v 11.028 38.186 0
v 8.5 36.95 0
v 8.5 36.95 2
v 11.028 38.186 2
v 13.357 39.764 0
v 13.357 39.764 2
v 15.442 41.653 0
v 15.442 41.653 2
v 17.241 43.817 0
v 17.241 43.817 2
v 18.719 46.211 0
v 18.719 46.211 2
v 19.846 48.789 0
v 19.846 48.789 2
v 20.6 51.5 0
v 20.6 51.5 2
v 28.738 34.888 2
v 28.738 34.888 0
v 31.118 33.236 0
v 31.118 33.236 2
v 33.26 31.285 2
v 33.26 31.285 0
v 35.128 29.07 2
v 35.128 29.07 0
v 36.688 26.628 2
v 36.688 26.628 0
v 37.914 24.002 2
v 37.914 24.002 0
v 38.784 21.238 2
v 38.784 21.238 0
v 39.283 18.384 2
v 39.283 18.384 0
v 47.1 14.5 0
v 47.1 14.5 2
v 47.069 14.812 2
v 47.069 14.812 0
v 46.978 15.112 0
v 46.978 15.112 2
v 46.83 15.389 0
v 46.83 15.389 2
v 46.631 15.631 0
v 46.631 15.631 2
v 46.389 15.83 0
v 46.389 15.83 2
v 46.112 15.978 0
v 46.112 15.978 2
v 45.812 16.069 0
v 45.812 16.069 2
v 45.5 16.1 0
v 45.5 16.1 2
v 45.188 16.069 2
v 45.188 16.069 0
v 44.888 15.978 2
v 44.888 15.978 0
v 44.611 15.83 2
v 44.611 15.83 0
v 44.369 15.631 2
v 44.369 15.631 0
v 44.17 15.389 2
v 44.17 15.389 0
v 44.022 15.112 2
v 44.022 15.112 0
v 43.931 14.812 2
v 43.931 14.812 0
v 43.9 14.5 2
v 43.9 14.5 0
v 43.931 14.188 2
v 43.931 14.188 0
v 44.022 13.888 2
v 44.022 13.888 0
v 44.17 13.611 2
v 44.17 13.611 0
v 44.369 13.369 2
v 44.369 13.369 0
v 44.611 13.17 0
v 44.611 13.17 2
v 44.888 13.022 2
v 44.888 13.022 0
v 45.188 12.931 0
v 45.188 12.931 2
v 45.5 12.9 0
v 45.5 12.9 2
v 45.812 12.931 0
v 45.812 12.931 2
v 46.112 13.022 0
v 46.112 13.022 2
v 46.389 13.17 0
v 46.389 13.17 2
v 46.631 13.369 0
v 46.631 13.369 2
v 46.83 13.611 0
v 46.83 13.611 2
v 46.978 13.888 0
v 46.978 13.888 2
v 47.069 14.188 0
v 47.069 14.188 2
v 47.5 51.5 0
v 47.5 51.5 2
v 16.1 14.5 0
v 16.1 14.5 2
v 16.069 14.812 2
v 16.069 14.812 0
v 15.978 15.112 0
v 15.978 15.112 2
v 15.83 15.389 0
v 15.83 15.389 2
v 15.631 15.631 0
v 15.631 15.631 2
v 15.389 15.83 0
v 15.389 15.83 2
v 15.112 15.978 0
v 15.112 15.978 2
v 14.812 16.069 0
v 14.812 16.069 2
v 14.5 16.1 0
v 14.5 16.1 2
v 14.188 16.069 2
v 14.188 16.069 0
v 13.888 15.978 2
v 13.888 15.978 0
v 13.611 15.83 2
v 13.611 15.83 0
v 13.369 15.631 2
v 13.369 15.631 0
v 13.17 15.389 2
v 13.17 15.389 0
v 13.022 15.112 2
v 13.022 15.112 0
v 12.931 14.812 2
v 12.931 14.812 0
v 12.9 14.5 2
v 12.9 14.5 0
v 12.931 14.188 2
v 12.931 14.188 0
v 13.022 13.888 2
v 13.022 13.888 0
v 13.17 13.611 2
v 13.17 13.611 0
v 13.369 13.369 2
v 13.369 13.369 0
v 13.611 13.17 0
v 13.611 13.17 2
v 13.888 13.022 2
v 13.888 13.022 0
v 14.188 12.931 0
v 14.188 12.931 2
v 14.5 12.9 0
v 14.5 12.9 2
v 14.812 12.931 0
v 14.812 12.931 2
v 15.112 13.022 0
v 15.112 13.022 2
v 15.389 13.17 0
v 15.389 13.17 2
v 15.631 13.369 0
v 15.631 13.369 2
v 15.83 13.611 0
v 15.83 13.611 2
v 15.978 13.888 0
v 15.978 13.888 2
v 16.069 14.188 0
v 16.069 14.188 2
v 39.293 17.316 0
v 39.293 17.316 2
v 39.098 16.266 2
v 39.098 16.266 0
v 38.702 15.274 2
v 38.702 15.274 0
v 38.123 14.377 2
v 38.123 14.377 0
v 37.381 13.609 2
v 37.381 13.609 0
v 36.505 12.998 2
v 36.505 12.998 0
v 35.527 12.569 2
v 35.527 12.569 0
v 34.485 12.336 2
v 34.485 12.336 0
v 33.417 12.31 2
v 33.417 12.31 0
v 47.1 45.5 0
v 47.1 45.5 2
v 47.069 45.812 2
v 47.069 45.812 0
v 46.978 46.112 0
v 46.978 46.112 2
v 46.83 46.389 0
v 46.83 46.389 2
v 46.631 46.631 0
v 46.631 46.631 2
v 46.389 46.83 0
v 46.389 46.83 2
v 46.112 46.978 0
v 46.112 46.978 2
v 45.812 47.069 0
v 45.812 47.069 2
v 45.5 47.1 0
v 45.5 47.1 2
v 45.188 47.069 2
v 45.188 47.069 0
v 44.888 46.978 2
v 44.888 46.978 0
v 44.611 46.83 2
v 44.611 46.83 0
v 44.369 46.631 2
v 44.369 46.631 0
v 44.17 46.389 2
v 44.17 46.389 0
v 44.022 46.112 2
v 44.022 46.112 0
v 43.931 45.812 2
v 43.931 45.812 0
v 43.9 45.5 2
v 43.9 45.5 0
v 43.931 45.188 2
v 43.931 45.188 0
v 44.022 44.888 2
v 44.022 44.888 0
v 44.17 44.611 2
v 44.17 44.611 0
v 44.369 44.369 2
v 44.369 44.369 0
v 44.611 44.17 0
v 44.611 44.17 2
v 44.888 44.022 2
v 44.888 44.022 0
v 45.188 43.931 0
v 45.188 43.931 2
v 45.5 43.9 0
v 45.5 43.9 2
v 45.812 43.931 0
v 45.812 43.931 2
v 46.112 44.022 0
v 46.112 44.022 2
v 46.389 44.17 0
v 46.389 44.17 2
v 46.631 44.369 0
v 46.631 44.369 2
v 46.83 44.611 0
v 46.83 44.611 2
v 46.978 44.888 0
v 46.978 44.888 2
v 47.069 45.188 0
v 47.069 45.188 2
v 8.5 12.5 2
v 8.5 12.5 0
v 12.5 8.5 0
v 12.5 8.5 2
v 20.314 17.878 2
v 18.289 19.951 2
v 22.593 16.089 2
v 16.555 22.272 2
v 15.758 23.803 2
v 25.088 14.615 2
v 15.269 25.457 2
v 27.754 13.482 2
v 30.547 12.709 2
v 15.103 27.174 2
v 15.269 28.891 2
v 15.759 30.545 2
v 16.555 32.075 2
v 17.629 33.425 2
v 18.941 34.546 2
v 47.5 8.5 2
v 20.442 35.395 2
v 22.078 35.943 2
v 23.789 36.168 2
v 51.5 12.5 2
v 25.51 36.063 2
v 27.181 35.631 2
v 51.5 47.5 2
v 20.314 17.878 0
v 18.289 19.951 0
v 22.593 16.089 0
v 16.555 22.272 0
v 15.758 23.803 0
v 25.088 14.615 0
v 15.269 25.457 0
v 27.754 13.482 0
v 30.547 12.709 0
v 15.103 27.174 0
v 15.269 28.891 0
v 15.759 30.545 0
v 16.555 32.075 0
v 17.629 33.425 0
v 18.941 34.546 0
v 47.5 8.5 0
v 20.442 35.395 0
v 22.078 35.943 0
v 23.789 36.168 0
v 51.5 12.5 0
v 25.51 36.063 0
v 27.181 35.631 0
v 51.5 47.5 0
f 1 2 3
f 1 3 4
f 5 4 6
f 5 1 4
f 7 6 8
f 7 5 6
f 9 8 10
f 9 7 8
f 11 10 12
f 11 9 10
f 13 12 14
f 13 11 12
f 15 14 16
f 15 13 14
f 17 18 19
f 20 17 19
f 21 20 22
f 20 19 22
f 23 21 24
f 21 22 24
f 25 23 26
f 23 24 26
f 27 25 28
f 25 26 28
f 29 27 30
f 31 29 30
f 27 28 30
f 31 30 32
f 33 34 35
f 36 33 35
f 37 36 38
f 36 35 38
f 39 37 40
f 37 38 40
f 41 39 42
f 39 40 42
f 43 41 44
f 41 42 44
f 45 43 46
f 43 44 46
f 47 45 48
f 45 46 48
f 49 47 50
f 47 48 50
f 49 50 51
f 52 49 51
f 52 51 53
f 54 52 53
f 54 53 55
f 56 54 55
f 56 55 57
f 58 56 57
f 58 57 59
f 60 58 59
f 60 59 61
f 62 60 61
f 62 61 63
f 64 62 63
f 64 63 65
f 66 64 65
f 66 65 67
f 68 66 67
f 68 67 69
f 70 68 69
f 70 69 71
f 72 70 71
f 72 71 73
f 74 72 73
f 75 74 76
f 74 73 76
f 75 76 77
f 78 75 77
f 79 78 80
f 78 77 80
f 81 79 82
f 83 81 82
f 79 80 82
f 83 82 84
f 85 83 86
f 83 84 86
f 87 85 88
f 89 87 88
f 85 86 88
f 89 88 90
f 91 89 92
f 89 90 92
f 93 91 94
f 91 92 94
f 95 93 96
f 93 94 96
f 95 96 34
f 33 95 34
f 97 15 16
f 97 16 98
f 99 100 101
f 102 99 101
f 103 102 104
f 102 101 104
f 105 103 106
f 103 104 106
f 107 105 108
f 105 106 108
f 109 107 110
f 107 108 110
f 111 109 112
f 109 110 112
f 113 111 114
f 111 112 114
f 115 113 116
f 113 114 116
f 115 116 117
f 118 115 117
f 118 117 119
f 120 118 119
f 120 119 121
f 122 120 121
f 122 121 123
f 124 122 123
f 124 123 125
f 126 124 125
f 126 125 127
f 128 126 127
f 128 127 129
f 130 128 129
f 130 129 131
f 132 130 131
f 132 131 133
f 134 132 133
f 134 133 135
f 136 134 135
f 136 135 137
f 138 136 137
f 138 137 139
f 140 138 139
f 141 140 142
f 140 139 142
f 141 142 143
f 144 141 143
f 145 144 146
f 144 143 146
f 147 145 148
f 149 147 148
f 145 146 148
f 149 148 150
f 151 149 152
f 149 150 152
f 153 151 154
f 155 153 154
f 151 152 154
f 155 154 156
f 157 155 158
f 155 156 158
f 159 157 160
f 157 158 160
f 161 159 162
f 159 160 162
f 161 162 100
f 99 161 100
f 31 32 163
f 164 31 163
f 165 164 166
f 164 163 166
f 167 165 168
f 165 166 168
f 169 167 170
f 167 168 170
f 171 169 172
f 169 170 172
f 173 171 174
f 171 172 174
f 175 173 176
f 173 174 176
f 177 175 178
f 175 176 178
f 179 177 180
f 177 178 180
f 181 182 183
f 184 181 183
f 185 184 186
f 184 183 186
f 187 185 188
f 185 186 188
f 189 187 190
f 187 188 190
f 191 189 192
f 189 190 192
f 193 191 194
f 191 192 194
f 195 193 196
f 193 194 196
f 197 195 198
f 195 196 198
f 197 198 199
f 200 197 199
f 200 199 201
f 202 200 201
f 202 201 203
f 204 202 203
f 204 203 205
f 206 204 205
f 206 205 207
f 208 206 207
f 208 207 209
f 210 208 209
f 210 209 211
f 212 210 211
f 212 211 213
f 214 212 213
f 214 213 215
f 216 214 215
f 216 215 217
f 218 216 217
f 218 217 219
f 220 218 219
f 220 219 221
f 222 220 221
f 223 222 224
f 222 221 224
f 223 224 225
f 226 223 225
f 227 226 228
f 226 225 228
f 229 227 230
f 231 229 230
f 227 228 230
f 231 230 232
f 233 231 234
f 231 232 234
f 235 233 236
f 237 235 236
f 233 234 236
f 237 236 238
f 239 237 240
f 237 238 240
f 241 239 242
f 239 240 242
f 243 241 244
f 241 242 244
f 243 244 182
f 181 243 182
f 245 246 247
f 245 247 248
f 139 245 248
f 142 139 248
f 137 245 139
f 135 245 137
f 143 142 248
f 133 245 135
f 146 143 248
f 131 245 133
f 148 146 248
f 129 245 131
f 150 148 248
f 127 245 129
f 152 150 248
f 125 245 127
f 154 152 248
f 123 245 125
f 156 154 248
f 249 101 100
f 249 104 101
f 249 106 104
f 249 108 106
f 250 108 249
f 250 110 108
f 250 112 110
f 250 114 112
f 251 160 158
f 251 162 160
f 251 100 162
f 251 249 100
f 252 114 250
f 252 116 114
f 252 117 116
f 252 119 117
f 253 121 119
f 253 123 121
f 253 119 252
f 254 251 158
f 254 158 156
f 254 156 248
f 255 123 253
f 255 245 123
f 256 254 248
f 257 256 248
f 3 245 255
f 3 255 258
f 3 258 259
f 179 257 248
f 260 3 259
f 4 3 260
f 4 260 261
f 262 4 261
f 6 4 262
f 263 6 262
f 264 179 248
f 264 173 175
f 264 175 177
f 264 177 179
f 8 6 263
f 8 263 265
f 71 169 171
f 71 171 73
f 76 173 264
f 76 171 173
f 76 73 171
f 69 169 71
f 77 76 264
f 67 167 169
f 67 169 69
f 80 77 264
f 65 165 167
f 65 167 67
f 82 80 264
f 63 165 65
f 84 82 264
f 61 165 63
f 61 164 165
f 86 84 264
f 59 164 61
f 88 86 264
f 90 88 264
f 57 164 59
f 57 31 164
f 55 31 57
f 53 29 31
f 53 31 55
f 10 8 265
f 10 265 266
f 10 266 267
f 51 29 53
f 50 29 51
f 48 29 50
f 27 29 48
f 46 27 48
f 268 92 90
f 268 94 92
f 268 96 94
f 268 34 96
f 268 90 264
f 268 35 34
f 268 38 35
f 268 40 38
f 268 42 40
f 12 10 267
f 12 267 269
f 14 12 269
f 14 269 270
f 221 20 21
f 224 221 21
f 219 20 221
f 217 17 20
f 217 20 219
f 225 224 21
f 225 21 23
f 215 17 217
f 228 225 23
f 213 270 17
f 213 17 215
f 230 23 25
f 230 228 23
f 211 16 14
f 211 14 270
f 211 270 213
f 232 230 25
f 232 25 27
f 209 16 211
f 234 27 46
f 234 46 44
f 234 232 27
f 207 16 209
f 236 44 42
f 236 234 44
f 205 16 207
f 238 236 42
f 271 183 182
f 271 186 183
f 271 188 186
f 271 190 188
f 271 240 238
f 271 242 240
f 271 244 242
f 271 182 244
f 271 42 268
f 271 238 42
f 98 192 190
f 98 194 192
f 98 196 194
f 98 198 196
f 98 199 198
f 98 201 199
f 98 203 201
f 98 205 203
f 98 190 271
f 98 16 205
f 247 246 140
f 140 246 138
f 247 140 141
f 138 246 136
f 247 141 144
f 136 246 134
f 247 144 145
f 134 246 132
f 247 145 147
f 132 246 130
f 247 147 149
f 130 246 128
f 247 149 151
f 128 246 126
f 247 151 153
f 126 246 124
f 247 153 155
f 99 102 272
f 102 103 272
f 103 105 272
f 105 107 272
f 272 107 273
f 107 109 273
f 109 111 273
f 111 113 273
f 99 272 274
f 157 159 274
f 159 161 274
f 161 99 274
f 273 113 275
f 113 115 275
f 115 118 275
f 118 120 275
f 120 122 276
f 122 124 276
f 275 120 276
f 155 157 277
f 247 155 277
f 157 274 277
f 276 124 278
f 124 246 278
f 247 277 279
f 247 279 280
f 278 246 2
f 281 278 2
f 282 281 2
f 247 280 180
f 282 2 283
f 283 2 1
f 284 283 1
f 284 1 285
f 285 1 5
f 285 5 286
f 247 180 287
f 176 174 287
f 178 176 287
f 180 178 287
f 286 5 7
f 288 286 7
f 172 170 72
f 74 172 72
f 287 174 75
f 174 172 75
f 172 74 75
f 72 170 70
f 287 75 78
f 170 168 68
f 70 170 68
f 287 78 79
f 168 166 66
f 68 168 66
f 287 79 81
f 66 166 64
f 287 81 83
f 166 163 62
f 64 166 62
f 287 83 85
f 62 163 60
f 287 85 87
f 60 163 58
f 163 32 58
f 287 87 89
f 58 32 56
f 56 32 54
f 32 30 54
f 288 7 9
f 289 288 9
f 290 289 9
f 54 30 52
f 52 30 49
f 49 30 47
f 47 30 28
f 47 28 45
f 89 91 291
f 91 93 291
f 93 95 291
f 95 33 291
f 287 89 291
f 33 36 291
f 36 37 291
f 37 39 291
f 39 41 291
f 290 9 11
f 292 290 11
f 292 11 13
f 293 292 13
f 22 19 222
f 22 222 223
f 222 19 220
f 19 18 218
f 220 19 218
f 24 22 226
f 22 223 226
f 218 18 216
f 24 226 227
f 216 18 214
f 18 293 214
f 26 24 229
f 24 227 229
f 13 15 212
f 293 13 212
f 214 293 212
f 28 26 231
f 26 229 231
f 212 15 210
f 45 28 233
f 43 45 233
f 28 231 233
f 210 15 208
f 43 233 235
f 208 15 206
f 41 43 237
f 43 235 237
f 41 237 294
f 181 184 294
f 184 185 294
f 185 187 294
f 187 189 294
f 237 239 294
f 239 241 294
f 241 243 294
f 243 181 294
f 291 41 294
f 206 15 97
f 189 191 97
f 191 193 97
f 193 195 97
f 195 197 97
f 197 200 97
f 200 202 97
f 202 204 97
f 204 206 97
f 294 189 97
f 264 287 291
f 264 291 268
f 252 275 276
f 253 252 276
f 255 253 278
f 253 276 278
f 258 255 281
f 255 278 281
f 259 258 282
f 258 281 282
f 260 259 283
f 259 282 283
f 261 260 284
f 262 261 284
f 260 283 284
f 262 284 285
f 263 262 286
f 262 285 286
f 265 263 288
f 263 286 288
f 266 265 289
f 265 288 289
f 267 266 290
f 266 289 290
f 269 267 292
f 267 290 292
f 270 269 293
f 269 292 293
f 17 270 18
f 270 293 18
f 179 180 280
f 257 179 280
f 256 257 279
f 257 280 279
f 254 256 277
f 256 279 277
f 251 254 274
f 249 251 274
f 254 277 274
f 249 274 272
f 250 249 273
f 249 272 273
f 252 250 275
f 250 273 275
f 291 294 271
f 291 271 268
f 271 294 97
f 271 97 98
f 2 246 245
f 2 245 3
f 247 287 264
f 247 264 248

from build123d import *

# Parameters (mm, degrees)
CROQUIS1_W              = 60
CROQUIS1_H              = 60
SALIENTE_EXTRUIR1_DEPTH = 2
CROQUIS7_R              = 1.6
CORTAR_EXTRUIR1_DEPTH   = 85.876380696
CROQUIS8_OUTSIDE_W      = 78.976
CROQUIS8_OUTSIDE_H      = 78.976
CORTAR_EXTRUIR2_DEPTH   = 10
CORTAR_EXTRUIR4_DEPTH   = 73.859453745
CHAFL_N1_SIZE           = 4


with BuildPart() as part:
    # Croquis1 → Saliente-Extruir1 (new body)
    with BuildSketch(Plane.XY):
        with Locations((30, 30)):
            Rectangle(CROQUIS1_W, CROQUIS1_H)
    extrude(amount=SALIENTE_EXTRUIR1_DEPTH)

    # Croquis7 → Cortar-Extruir1 (cut, through all)
    with BuildSketch(Plane.XY.offset(2)):
        with Locations((14.5, 45.5)):
            Circle(CROQUIS7_R)
        with Locations((45.5, 45.5)):
            Circle(CROQUIS7_R)
        with Locations((14.5, 14.5)):
            Circle(CROQUIS7_R)
        with Locations((45.5, 14.5)):
            Circle(CROQUIS7_R)
    extrude(amount=-CORTAR_EXTRUIR1_DEPTH, mode=Mode.SUBTRACT)

    # Croquis8 outside → Cortar-Extruir2 (cut)
    with BuildSketch(Plane(origin=(0, 0, 0), x_dir=(-1, 0, 0), z_dir=(0, 0, -1))):
        with Locations((-30, 30)):
            Rectangle(CROQUIS8_OUTSIDE_W, CROQUIS8_OUTSIDE_H)
        with BuildLine():
            Line((-51.5, 51.5), (-51.5, 8.5))
            Line((-51.5, 8.5), (-8.5, 8.5))
            Line((-8.5, 8.5), (-8.5, 36.95))
            ThreePointArc((-8.5, 36.95), (-16.379748932, 42.703353122), (-20.6, 51.5))
            Line((-20.6, 51.5), (-51.5, 51.5))
        make_face(mode=Mode.SUBTRACT)
    extrude(amount=-CORTAR_EXTRUIR2_DEPTH, mode=Mode.SUBTRACT)

    # Croquis10 → Cortar-Extruir4 (cut, through all)
    with BuildSketch(Plane(origin=(0, 0, 0), x_dir=(-1, 0, 0), z_dir=(0, 0, -1))):
        with BuildLine():
            ThreePointArc((-39.282790937, 18.384108052), (-37.770757205, 13.974782814), (-33.416887225, 12.30978694))
            ThreePointArc((-33.416887225, 12.30978694), (-23.815977303, 15.311202908), (-16.554661394, 22.2724715))
            ThreePointArc((-16.554661394, 22.2724715), (-17.629242795, 33.425217186), (-28.737692181, 34.888369193))
            ThreePointArc((-28.737692181, 34.888369193), (-35.948136426, 27.874421452), (-39.282790937, 18.384108052))
        make_face()
    extrude(amount=-CORTAR_EXTRUIR4_DEPTH, mode=Mode.SUBTRACT)

    # Chaflán1
    chafl_n1_edges = [part.edges().sort_by_distance(p)[0] for p in [
        (8.5, 8.5, 1),
        (51.5, 8.5, 1),
        (51.5, 51.5, 1),
    ]]
    chamfer(chafl_n1_edges, length=CHAFL_N1_SIZE)


solid = part.part
